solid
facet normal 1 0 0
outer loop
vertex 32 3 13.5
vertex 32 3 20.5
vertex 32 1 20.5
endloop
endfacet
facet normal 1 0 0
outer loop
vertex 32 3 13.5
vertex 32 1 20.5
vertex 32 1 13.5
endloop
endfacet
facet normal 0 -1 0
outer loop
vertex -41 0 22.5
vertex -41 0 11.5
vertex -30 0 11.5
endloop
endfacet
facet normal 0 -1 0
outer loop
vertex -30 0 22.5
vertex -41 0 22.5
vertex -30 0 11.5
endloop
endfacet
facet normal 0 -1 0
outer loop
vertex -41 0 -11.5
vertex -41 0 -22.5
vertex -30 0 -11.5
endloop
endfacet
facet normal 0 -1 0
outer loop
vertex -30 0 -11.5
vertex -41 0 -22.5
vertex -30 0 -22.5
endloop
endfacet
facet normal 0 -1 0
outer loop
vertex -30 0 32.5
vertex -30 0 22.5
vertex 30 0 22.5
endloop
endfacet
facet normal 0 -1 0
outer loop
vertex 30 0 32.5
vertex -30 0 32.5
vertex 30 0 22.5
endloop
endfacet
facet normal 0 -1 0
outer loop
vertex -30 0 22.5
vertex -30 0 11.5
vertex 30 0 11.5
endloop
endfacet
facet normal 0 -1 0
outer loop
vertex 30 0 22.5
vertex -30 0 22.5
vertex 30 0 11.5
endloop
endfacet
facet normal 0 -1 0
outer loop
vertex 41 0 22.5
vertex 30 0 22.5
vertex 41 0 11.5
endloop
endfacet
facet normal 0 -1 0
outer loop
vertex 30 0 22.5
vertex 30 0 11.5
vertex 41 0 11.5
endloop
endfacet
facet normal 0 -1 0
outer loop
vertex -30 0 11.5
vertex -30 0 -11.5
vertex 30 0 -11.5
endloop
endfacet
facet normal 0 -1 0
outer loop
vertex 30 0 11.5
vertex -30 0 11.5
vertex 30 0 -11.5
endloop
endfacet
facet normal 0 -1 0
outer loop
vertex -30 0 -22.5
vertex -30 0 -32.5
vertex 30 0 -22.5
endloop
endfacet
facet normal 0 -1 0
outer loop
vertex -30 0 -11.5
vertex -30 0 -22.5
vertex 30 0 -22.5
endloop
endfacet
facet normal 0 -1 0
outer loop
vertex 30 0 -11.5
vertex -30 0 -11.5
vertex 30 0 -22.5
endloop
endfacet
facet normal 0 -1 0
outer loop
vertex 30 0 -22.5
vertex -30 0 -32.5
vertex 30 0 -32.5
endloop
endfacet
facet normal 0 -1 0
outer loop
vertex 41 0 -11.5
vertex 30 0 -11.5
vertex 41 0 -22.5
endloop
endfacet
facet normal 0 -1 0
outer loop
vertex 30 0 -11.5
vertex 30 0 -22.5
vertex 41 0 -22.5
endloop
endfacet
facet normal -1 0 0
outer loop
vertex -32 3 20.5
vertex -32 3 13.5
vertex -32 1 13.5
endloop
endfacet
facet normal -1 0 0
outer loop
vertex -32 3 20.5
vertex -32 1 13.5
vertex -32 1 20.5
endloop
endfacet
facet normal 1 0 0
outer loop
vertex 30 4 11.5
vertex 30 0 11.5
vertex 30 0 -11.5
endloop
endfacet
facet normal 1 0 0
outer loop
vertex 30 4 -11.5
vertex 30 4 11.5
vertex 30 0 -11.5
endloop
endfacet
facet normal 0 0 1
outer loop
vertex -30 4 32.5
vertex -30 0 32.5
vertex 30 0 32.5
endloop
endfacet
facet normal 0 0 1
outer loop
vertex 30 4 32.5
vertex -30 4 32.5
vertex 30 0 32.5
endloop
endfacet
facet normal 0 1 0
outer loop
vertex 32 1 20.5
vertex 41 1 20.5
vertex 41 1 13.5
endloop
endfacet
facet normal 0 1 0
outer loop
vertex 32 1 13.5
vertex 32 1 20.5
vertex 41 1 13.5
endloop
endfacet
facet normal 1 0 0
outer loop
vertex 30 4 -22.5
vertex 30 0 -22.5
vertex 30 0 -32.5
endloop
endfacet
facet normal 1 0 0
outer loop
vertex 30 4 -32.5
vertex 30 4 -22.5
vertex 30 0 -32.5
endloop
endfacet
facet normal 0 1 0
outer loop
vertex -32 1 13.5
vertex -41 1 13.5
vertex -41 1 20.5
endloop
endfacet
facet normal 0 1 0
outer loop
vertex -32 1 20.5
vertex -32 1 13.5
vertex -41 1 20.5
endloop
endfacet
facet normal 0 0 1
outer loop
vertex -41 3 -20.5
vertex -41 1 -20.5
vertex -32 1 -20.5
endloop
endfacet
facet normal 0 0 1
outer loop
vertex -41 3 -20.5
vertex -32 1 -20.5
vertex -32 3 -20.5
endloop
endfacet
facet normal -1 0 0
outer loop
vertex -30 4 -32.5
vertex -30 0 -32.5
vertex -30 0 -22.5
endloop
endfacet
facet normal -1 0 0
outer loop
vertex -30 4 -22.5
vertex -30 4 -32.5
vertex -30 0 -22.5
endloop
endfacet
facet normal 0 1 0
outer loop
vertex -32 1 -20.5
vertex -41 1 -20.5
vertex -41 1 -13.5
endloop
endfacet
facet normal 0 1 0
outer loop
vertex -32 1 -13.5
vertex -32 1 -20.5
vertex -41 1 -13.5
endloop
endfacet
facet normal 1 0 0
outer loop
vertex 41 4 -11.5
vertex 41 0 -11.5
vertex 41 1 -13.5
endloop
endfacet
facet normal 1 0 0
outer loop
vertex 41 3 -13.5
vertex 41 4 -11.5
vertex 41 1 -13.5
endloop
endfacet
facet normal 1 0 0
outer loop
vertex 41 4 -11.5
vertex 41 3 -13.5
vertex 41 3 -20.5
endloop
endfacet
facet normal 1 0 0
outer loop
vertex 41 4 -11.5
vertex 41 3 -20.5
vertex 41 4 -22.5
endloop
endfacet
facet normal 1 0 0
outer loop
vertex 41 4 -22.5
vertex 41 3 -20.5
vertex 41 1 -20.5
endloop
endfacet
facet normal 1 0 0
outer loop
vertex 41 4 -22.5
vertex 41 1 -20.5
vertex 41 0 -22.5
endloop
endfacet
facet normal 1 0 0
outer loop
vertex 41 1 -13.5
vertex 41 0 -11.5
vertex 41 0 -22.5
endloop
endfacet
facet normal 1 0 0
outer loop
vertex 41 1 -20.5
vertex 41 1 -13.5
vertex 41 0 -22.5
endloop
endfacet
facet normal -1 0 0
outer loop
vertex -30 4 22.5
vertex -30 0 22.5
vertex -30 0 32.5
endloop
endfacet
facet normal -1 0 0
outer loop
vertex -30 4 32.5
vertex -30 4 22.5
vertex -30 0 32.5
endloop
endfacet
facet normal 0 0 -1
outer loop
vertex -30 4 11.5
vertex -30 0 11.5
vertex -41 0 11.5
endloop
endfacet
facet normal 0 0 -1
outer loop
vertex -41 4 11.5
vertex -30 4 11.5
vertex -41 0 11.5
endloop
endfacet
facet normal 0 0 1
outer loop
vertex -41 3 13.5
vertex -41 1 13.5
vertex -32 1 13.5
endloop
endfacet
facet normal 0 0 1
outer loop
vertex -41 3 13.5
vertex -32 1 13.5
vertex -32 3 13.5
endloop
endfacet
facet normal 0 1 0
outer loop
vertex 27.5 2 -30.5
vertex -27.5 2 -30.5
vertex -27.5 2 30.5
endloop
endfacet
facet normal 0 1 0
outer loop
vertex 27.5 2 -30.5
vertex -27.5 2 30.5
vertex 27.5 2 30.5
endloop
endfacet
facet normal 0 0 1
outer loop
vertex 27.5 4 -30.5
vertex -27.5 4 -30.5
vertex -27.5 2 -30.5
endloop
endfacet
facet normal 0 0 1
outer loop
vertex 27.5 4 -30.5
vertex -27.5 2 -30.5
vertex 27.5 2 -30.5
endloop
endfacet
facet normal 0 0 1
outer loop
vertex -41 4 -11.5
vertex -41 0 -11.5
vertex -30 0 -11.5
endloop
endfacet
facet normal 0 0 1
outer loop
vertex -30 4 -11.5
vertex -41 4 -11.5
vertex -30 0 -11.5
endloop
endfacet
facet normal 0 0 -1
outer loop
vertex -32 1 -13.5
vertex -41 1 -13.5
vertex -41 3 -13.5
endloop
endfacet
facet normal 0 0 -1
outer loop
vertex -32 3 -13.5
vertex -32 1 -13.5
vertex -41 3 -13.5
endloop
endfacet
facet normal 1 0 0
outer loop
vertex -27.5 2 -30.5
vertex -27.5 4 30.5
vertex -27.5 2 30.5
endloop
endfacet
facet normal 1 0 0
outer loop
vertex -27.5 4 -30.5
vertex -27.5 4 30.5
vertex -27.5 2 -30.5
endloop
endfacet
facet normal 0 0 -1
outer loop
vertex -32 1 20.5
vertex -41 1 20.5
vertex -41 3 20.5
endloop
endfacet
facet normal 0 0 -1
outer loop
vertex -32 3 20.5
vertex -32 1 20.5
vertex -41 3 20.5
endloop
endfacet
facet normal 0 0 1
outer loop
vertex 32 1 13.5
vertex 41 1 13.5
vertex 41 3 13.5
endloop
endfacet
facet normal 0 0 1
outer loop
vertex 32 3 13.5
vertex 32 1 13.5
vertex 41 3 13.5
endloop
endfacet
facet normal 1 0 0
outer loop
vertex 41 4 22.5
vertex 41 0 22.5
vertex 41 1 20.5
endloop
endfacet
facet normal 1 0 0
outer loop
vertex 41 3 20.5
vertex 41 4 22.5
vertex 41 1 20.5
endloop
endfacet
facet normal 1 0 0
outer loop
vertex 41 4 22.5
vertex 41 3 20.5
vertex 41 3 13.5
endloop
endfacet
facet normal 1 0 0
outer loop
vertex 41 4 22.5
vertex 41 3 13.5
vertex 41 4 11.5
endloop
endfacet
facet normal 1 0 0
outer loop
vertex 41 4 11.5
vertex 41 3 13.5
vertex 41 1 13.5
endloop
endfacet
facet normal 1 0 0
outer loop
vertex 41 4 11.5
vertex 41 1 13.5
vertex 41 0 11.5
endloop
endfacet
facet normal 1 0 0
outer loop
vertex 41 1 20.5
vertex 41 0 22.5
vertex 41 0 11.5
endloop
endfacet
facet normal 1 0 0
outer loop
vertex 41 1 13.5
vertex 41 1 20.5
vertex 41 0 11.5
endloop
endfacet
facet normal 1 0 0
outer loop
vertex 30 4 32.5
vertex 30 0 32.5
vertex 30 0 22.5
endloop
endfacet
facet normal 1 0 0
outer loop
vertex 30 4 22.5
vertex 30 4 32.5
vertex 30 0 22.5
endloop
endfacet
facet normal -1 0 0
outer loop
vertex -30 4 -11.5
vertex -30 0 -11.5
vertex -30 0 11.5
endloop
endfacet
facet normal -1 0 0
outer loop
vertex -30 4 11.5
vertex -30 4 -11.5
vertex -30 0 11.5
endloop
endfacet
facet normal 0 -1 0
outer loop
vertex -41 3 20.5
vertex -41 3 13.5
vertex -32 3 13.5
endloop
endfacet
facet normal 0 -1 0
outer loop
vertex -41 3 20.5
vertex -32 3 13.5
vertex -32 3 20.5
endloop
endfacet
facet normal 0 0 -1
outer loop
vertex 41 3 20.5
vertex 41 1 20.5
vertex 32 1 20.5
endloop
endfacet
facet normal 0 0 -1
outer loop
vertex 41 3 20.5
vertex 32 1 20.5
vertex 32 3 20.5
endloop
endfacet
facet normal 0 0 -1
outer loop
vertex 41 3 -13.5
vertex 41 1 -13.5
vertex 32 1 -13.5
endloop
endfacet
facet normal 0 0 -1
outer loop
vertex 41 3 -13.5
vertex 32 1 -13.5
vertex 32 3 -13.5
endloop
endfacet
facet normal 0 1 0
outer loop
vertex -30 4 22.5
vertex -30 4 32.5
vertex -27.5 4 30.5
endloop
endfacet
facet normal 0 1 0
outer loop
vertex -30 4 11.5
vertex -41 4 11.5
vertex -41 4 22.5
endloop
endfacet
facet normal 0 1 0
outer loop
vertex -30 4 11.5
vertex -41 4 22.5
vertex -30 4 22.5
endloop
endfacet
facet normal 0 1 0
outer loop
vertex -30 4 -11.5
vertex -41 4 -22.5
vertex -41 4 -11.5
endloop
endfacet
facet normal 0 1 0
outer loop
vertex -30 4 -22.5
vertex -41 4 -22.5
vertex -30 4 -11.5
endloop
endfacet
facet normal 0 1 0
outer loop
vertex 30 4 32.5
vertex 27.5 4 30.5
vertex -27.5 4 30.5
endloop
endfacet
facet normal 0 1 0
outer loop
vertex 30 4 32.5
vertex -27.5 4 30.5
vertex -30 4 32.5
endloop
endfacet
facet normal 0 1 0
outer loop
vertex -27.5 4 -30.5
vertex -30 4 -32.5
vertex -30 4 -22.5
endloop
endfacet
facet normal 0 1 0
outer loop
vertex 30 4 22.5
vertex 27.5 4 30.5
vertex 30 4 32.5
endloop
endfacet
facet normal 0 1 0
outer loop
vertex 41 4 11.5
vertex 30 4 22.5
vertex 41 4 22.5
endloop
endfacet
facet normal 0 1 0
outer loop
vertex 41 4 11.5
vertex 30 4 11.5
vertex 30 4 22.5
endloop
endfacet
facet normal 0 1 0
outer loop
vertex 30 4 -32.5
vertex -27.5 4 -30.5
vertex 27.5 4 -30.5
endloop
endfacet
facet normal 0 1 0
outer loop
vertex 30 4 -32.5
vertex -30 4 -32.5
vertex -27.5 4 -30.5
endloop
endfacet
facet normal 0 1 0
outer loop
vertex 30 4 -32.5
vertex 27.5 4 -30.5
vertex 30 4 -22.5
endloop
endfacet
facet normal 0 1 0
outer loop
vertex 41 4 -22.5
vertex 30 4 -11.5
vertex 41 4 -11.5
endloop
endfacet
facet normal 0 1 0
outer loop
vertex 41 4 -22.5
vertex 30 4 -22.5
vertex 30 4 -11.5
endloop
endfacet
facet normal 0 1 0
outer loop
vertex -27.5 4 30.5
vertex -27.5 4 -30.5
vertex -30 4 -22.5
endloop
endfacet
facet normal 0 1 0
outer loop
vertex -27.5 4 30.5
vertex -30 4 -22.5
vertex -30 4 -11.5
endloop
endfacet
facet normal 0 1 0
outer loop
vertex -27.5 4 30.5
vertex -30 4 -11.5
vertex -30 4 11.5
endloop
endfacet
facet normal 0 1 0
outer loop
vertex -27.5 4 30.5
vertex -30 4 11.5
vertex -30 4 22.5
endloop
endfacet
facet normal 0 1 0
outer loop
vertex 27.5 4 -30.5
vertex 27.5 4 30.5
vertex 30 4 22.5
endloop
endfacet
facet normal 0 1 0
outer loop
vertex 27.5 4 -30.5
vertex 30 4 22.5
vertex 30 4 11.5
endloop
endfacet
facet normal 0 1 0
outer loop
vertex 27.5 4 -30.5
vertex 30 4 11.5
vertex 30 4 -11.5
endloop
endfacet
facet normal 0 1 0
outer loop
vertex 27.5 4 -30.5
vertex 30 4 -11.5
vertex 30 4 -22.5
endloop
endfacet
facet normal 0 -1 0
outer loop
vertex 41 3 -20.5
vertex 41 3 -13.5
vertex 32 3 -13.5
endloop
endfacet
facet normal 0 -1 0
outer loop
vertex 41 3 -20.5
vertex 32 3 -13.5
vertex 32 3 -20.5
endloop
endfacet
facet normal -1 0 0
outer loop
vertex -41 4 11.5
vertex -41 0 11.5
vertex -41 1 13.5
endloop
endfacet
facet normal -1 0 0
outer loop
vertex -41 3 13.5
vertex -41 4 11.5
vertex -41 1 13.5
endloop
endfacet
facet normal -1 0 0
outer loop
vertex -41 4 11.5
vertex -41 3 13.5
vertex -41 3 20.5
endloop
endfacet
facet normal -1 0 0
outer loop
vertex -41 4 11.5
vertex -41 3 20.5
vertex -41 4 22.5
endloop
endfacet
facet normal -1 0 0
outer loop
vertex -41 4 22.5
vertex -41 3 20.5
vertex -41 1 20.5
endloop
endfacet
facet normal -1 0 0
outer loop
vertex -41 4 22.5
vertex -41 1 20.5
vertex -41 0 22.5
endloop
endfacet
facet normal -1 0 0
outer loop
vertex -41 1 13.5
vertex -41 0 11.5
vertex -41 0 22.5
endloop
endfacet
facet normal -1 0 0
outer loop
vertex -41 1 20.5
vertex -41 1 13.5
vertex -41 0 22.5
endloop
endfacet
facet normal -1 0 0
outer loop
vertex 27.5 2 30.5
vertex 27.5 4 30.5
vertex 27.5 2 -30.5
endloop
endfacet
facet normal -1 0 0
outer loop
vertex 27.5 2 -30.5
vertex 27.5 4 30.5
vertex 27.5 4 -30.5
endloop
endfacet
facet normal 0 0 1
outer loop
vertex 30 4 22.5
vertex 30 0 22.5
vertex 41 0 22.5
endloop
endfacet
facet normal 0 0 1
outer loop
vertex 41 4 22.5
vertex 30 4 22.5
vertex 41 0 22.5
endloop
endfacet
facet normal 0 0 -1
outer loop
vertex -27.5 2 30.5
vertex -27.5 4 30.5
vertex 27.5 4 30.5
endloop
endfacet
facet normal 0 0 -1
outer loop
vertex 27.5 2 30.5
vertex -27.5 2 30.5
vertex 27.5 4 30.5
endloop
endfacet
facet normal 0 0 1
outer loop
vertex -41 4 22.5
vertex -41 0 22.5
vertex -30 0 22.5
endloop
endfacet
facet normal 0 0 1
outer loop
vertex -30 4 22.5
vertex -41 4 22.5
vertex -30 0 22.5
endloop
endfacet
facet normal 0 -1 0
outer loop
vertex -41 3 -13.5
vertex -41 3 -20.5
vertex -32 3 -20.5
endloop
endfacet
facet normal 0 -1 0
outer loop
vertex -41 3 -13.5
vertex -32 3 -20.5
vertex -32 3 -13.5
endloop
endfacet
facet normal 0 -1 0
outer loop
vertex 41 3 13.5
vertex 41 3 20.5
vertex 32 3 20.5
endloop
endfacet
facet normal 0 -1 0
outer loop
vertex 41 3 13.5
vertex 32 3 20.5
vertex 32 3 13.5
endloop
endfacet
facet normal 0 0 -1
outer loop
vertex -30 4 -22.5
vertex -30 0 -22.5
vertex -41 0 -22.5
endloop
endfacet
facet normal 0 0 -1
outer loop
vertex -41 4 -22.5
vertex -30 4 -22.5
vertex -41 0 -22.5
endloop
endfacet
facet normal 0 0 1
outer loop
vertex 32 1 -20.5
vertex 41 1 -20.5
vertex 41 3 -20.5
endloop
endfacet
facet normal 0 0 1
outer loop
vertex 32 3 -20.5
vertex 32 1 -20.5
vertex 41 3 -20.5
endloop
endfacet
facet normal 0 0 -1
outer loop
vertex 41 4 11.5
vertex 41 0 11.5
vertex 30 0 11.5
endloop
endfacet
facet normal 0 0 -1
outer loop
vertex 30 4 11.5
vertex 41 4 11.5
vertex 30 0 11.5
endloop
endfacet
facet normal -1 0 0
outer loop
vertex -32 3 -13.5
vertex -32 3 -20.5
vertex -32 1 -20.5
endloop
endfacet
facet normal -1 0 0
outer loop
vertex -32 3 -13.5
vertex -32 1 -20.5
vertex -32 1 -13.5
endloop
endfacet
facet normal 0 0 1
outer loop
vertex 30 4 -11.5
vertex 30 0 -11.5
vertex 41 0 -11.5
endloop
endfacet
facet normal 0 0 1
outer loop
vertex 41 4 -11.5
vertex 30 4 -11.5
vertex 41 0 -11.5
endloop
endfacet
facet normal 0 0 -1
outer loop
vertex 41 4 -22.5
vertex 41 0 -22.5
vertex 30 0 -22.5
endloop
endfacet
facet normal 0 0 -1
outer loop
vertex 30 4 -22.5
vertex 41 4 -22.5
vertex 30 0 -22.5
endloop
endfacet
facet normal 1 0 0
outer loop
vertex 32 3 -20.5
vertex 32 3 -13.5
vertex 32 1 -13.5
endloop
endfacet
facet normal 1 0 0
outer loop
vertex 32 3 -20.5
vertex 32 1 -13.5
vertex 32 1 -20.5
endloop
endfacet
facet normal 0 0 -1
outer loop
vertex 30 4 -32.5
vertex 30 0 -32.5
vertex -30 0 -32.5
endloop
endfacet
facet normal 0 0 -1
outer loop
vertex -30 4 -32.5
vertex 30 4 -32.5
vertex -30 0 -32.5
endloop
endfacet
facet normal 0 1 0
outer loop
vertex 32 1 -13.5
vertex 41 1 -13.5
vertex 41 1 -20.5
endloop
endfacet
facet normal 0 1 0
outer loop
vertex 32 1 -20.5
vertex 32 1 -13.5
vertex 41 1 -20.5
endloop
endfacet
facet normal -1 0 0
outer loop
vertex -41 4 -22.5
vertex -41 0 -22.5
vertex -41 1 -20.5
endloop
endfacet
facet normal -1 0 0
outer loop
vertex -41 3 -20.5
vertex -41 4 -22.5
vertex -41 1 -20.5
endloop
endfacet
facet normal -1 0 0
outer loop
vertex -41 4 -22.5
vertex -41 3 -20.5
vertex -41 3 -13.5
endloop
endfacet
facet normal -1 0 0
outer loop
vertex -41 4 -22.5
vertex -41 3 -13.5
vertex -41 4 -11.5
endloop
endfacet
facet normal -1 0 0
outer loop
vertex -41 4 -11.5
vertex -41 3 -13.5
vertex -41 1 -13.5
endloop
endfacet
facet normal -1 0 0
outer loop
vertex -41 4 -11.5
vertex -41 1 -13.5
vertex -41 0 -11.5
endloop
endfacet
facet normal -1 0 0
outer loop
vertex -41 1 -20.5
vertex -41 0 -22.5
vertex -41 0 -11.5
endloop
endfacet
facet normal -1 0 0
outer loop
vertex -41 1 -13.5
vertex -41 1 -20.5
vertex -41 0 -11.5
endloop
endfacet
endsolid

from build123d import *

# Parameters (mm, degrees)
SALIENTE_EXTRUIR1_DEPTH = 4
CROQUIS2_W              = 55
CROQUIS2_H              = 61
CORTAR_EXTRUIR1_DEPTH   = 2
CROQUIS4_W              = 7
CROQUIS4_H              = 2
CORTAR_EXTRUIR2_DEPTH   = 9
CROQUIS6_W              = 7
CROQUIS6_H              = 2
CORTAR_EXTRUIR3_DEPTH   = 9
CROQUIS7_W              = 7
CROQUIS7_H              = 2
CORTAR_EXTRUIR4_DEPTH   = 9
CROQUIS8_W              = 7
CROQUIS8_H              = 2
CORTAR_EXTRUIR5_DEPTH   = 9


with BuildPart() as part:
    # Croquis1 → Saliente-Extruir1 (new body)
    with BuildSketch(Plane(origin=(0, 0, 0), x_dir=(1, 0, 0), z_dir=(0, 1, 0))):
        Polygon((30, -32.5), (30, -22.5), (41, -22.5), (41, -11.5), (30, -11.5), (30, 11.5), (41, 11.5), (41, 22.5), (30, 22.5), (30, 32.5), (-30, 32.5), (-30, 22.5), (-41, 22.5), (-41, 11.5), (-30, 11.5), (-30, -11.5), (-41, -11.5), (-41, -22.5), (-30, -22.5), (-30, -32.5), align=None)
    extrude(amount=SALIENTE_EXTRUIR1_DEPTH)

    # Croquis2 → Cortar-Extruir1 (cut)
    with BuildSketch(Plane(origin=(0, 4, 0), x_dir=(1, 0, 0), z_dir=(0, 1, 0))):
        Rectangle(CROQUIS2_W, CROQUIS2_H)
    extrude(amount=-CORTAR_EXTRUIR1_DEPTH, mode=Mode.SUBTRACT)

    # Croquis4 → Cortar-Extruir2 (cut)
    with BuildSketch(Plane.ZY.offset(41)):
        with Locations((-17, 2)):
            Rectangle(CROQUIS4_W, CROQUIS4_H)
    extrude(amount=-CORTAR_EXTRUIR2_DEPTH, mode=Mode.SUBTRACT)

    # Croquis6 → Cortar-Extruir3 (cut)
    with BuildSketch(Plane.ZY.offset(41)):
        with Locations((17, 2)):
            Rectangle(CROQUIS6_W, CROQUIS6_H)
    extrude(amount=-CORTAR_EXTRUIR3_DEPTH, mode=Mode.SUBTRACT)

    # Croquis7 → Cortar-Extruir4 (cut)
    with BuildSketch(Plane(origin=(41, 0, 0), x_dir=(0, 0, -1), z_dir=(1, 0, 0))):
        with Locations((-17, 2)):
            Rectangle(CROQUIS7_W, CROQUIS7_H)
    extrude(amount=-CORTAR_EXTRUIR4_DEPTH, mode=Mode.SUBTRACT)

    # Croquis8 → Cortar-Extruir5 (cut)
    with BuildSketch(Plane(origin=(41, 0, 0), x_dir=(0, 0, -1), z_dir=(1, 0, 0))):
        with Locations((17, 2)):
            Rectangle(CROQUIS8_W, CROQUIS8_H)
    extrude(amount=-CORTAR_EXTRUIR5_DEPTH, mode=Mode.SUBTRACT)


solid = part.part
